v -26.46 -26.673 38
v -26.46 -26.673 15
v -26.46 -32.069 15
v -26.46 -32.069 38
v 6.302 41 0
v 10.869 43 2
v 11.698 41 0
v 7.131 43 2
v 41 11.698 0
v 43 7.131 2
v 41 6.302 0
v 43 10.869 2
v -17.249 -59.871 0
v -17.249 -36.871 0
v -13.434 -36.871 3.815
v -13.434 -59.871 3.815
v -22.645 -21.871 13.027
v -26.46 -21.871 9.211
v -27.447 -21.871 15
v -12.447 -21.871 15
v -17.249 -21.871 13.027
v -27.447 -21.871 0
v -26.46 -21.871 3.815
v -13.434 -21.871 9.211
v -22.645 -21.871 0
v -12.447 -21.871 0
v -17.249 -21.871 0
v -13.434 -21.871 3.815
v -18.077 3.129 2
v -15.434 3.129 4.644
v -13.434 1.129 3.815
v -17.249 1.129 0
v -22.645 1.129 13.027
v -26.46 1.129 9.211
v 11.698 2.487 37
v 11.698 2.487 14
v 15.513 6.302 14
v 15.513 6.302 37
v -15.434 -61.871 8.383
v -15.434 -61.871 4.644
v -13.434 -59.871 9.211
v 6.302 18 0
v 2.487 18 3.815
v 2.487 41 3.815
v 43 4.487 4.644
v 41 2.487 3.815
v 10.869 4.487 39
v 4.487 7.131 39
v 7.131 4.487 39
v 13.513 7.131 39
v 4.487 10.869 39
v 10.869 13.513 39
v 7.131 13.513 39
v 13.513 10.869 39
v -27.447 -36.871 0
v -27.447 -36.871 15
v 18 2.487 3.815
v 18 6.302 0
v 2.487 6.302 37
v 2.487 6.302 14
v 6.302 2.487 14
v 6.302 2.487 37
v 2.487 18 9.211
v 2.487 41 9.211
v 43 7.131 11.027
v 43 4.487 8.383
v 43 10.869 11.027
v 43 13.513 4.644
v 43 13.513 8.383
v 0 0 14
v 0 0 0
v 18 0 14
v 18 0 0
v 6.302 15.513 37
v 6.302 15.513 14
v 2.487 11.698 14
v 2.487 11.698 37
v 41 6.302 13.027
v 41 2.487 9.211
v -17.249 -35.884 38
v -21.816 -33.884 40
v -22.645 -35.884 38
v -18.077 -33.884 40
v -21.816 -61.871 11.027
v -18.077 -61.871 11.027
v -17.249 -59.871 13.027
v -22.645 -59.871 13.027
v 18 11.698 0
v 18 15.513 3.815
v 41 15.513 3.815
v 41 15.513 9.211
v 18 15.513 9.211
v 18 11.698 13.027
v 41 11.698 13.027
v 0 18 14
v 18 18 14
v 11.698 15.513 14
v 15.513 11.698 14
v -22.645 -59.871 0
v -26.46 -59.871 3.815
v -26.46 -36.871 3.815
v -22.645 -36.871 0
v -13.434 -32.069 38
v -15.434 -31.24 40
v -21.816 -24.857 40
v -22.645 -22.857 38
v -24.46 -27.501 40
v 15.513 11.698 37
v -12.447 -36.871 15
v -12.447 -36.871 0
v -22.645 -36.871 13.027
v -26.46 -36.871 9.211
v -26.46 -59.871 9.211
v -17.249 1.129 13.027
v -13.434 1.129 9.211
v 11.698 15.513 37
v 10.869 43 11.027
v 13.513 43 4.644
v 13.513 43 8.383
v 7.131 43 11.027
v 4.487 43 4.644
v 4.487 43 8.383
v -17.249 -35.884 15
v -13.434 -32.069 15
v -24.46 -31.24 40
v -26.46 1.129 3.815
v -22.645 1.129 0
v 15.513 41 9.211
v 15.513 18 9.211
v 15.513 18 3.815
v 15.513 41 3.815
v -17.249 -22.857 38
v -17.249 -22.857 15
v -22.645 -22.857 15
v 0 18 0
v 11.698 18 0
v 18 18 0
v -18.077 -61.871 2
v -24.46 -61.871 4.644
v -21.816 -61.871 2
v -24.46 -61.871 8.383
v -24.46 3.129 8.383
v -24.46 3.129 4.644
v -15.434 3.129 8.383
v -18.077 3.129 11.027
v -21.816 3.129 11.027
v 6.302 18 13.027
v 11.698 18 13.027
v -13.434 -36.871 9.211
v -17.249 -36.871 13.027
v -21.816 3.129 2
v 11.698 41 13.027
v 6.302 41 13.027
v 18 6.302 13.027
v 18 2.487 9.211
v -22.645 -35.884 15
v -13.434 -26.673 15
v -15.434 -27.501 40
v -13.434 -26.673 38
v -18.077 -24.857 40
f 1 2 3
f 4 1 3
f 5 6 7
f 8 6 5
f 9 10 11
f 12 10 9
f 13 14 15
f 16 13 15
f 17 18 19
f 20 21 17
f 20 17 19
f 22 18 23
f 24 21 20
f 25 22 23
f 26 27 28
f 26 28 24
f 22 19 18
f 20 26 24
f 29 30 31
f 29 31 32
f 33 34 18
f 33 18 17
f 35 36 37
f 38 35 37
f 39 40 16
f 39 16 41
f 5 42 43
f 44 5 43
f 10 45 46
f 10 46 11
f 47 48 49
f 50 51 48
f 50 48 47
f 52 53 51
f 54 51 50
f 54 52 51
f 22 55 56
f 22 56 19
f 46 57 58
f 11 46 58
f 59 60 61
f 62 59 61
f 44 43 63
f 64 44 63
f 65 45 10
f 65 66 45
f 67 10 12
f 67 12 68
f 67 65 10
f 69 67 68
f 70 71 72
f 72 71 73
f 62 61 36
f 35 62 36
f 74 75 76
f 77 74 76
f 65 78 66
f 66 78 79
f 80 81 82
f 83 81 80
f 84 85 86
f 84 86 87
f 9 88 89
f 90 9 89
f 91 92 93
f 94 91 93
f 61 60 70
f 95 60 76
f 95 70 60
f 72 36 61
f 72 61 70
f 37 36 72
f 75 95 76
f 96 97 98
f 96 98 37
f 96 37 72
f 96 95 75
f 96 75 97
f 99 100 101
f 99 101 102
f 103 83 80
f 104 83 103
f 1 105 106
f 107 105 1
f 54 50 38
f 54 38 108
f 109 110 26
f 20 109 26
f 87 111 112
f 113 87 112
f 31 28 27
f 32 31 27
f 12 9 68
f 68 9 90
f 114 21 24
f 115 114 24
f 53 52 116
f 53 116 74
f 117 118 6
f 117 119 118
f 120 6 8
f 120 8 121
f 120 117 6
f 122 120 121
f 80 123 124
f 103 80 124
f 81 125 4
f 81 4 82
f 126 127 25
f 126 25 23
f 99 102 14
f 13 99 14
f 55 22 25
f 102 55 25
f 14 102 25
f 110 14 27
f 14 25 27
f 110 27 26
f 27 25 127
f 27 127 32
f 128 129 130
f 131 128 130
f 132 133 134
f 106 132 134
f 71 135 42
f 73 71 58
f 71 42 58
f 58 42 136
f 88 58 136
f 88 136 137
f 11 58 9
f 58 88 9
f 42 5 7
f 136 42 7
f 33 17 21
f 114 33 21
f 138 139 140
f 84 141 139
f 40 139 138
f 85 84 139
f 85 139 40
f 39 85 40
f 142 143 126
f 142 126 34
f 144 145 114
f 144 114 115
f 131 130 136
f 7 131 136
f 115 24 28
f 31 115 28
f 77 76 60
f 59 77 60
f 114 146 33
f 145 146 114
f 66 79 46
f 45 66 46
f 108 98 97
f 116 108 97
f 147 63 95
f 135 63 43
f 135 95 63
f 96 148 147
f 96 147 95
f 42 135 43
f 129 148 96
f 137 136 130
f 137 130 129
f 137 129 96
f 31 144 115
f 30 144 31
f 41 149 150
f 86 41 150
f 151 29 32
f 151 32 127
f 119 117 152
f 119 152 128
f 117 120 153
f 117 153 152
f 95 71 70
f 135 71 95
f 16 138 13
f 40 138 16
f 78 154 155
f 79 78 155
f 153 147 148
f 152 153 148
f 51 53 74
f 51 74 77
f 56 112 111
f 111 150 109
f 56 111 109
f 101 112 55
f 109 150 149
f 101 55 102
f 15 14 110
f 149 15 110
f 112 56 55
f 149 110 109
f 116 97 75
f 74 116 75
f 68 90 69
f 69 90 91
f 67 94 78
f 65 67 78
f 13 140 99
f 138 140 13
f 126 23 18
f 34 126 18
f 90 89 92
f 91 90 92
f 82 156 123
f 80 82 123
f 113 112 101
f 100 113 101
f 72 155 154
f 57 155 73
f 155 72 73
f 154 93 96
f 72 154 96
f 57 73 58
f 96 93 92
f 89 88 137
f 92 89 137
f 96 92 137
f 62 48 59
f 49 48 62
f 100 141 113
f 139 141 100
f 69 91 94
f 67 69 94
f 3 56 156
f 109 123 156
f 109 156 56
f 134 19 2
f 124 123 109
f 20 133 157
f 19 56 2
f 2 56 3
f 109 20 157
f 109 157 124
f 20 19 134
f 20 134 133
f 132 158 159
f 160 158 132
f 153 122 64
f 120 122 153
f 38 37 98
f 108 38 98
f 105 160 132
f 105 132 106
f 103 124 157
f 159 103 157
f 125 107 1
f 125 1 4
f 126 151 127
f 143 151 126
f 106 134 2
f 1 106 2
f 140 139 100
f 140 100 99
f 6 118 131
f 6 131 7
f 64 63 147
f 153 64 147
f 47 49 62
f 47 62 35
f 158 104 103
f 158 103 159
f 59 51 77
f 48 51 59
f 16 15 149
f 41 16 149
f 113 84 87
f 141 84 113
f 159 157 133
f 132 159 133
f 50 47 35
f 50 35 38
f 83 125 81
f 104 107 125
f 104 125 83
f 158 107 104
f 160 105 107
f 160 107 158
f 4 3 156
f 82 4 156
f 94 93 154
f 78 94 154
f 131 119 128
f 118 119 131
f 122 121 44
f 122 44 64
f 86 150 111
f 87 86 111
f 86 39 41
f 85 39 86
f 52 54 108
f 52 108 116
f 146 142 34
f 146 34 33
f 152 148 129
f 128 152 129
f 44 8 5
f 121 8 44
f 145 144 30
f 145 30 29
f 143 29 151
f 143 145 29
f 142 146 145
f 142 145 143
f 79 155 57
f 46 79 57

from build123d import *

# Parameters (mm, degrees)
F0_W      = 18
F0_H      = 18
F1_DEPTH  = 14
F5_DEPTH  = 25
F6_DEPTH  = 25
F7_DEPTH  = 25
F8_SIZE   = 2
F9_W      = 15
F9_H      = 15
F10_DEPTH = 15
F14_DEPTH = 25
F15_DEPTH = 25
F16_DEPTH = 25
F17_SIZE  = 2


with BuildPart() as f1:
    # F0 (on Top) → F1 (new body)
    with BuildSketch(Plane.XY):
        with Locations((9, 9)):
            Rectangle(F0_W, F0_H)
    extrude(amount=F1_DEPTH)

    # F2 (on face) → F5 (join)
    with BuildSketch(Plane.YZ.offset(18)):
        Polygon((6.302082, 0), (11.697918, 0), (15.513351, 3.815433), (15.513351, 9.211269), (11.697918, 13.026701), (6.302082, 13.026701), (2.486649, 9.211269), (2.486649, 3.815433), align=None)
    extrude(amount=F5_DEPTH)

    # F3 (on face) → F6 (join)
    with BuildSketch(Plane(origin=(0, 18, 0), x_dir=(-1, 0, 0), z_dir=(0, 1, 0))):
        Polygon((-11.697918, 0), (-6.302082, 0), (-2.486649, 3.815433), (-2.486649, 9.211269), (-6.302082, 13.026701), (-11.697918, 13.026701), (-15.513351, 9.211269), (-15.513351, 3.815433), align=None)
    extrude(amount=F6_DEPTH)

    # F4 (on face) → F7 (join)
    with BuildSketch(Plane.XY.offset(14)):
        Polygon((11.697918, 15.513351), (6.302082, 15.513351), (2.486649, 11.697918), (2.486649, 6.302082), (6.302082, 2.486649), (11.697918, 2.486649), (15.513351, 6.302082), (15.513351, 11.697918), align=None)
    extrude(amount=F7_DEPTH)

    # F8
    f8_edges = [f1.edges().sort_by_distance(p)[0] for p in [
        (9, 15.513351, 39),
        (4.394366, 13.605634, 39),
        (2.486649, 9, 39),
        (4.394366, 4.394366, 39),
        (9, 2.486649, 39),
        (13.605634, 4.394366, 39),
        (15.513351, 9, 39),
        (13.605634, 13.605634, 39),
        (43, 4.394366, 1.907716),
        (43, 9, 0),
        (43, 13.605634, 1.907716),
        (43, 15.513351, 6.513351),
        (43, 13.605634, 11.118985),
        (43, 9, 13.026701),
        (43, 4.394366, 11.118985),
        (43, 2.486649, 6.513351),
        (13.605634, 43, 1.907716),
        (9, 43, 0),
        (4.394366, 43, 1.907716),
        (2.486649, 43, 6.513351),
        (4.394366, 43, 11.118985),
        (9, 43, 13.026701),
        (13.605634, 43, 11.118985),
        (15.513351, 43, 6.513351),
    ]]
    chamfer(f8_edges, length=F8_SIZE)


with BuildPart() as f10:
    # F9 (on Top) → F10 (new body)
    with BuildSketch(Plane.XY):
        with Locations((-19.946877, -29.370772)):
            Rectangle(F9_W, F9_H)
    extrude(amount=F10_DEPTH)

    # F11 (on face) → F14 (join)
    with BuildSketch(Plane.XZ.offset(36.870772)):
        Polygon((-22.644795, 0), (-17.248959, 0), (-13.433526, 3.815433), (-13.433526, 9.211269), (-17.248959, 13.026701), (-22.644795, 13.026701), (-26.460227, 9.211269), (-26.460227, 3.815433), align=None)
    extrude(amount=F14_DEPTH)

    # F12 (on face) → F15 (join)
    with BuildSketch(Plane(origin=(0, -21.870772, 0), x_dir=(-1, 0, 0), z_dir=(0, 1, 0))):
        Polygon((17.248959, 0), (22.644795, 0), (26.460227, 3.815433), (26.460227, 9.211269), (22.644795, 13.026701), (17.248959, 13.026701), (13.433526, 9.211269), (13.433526, 3.815433), align=None)
    extrude(amount=F15_DEPTH)

    # F13 (on face) → F16 (join)
    with BuildSketch(Plane.XY.offset(15)):
        Polygon((-22.644795, -35.884123), (-17.248959, -35.884123), (-13.433526, -32.06869), (-13.433526, -26.672854), (-17.248959, -22.857421), (-22.644795, -22.857421), (-26.460227, -26.672854), (-26.460227, -32.06869), align=None)
    extrude(amount=F16_DEPTH)

    # F17
    f17_edges = [f10.edges().sort_by_distance(p)[0] for p in [
        (-24.552511, -61.870772, 1.907716),
        (-19.946877, -61.870772, 0),
        (-15.341242, -61.870772, 1.907716),
        (-13.433526, -61.870772, 6.513351),
        (-15.341242, -61.870772, 11.118985),
        (-19.946877, -61.870772, 13.026701),
        (-24.552511, -61.870772, 11.118985),
        (-26.460227, -61.870772, 6.513351),
        (-24.552511, -33.976406, 40),
        (-19.946877, -35.884123, 40),
        (-15.341242, -33.976406, 40),
        (-13.433526, -29.370772, 40),
        (-15.341242, -24.765137, 40),
        (-19.946877, -22.857421, 40),
        (-24.552511, -24.765137, 40),
        (-26.460227, -29.370772, 40),
        (-13.433526, 3.129228, 6.513351),
        (-15.341242, 3.129228, 1.907716),
        (-19.946877, 3.129228, 0),
        (-24.552511, 3.129228, 1.907716),
        (-26.460227, 3.129228, 6.513351),
        (-24.552511, 3.129228, 11.118985),
        (-19.946877, 3.129228, 13.026701),
        (-15.341242, 3.129228, 11.118985),
    ]]
    chamfer(f17_edges, length=F17_SIZE)


solid = Compound([f1.part, f10.part])
